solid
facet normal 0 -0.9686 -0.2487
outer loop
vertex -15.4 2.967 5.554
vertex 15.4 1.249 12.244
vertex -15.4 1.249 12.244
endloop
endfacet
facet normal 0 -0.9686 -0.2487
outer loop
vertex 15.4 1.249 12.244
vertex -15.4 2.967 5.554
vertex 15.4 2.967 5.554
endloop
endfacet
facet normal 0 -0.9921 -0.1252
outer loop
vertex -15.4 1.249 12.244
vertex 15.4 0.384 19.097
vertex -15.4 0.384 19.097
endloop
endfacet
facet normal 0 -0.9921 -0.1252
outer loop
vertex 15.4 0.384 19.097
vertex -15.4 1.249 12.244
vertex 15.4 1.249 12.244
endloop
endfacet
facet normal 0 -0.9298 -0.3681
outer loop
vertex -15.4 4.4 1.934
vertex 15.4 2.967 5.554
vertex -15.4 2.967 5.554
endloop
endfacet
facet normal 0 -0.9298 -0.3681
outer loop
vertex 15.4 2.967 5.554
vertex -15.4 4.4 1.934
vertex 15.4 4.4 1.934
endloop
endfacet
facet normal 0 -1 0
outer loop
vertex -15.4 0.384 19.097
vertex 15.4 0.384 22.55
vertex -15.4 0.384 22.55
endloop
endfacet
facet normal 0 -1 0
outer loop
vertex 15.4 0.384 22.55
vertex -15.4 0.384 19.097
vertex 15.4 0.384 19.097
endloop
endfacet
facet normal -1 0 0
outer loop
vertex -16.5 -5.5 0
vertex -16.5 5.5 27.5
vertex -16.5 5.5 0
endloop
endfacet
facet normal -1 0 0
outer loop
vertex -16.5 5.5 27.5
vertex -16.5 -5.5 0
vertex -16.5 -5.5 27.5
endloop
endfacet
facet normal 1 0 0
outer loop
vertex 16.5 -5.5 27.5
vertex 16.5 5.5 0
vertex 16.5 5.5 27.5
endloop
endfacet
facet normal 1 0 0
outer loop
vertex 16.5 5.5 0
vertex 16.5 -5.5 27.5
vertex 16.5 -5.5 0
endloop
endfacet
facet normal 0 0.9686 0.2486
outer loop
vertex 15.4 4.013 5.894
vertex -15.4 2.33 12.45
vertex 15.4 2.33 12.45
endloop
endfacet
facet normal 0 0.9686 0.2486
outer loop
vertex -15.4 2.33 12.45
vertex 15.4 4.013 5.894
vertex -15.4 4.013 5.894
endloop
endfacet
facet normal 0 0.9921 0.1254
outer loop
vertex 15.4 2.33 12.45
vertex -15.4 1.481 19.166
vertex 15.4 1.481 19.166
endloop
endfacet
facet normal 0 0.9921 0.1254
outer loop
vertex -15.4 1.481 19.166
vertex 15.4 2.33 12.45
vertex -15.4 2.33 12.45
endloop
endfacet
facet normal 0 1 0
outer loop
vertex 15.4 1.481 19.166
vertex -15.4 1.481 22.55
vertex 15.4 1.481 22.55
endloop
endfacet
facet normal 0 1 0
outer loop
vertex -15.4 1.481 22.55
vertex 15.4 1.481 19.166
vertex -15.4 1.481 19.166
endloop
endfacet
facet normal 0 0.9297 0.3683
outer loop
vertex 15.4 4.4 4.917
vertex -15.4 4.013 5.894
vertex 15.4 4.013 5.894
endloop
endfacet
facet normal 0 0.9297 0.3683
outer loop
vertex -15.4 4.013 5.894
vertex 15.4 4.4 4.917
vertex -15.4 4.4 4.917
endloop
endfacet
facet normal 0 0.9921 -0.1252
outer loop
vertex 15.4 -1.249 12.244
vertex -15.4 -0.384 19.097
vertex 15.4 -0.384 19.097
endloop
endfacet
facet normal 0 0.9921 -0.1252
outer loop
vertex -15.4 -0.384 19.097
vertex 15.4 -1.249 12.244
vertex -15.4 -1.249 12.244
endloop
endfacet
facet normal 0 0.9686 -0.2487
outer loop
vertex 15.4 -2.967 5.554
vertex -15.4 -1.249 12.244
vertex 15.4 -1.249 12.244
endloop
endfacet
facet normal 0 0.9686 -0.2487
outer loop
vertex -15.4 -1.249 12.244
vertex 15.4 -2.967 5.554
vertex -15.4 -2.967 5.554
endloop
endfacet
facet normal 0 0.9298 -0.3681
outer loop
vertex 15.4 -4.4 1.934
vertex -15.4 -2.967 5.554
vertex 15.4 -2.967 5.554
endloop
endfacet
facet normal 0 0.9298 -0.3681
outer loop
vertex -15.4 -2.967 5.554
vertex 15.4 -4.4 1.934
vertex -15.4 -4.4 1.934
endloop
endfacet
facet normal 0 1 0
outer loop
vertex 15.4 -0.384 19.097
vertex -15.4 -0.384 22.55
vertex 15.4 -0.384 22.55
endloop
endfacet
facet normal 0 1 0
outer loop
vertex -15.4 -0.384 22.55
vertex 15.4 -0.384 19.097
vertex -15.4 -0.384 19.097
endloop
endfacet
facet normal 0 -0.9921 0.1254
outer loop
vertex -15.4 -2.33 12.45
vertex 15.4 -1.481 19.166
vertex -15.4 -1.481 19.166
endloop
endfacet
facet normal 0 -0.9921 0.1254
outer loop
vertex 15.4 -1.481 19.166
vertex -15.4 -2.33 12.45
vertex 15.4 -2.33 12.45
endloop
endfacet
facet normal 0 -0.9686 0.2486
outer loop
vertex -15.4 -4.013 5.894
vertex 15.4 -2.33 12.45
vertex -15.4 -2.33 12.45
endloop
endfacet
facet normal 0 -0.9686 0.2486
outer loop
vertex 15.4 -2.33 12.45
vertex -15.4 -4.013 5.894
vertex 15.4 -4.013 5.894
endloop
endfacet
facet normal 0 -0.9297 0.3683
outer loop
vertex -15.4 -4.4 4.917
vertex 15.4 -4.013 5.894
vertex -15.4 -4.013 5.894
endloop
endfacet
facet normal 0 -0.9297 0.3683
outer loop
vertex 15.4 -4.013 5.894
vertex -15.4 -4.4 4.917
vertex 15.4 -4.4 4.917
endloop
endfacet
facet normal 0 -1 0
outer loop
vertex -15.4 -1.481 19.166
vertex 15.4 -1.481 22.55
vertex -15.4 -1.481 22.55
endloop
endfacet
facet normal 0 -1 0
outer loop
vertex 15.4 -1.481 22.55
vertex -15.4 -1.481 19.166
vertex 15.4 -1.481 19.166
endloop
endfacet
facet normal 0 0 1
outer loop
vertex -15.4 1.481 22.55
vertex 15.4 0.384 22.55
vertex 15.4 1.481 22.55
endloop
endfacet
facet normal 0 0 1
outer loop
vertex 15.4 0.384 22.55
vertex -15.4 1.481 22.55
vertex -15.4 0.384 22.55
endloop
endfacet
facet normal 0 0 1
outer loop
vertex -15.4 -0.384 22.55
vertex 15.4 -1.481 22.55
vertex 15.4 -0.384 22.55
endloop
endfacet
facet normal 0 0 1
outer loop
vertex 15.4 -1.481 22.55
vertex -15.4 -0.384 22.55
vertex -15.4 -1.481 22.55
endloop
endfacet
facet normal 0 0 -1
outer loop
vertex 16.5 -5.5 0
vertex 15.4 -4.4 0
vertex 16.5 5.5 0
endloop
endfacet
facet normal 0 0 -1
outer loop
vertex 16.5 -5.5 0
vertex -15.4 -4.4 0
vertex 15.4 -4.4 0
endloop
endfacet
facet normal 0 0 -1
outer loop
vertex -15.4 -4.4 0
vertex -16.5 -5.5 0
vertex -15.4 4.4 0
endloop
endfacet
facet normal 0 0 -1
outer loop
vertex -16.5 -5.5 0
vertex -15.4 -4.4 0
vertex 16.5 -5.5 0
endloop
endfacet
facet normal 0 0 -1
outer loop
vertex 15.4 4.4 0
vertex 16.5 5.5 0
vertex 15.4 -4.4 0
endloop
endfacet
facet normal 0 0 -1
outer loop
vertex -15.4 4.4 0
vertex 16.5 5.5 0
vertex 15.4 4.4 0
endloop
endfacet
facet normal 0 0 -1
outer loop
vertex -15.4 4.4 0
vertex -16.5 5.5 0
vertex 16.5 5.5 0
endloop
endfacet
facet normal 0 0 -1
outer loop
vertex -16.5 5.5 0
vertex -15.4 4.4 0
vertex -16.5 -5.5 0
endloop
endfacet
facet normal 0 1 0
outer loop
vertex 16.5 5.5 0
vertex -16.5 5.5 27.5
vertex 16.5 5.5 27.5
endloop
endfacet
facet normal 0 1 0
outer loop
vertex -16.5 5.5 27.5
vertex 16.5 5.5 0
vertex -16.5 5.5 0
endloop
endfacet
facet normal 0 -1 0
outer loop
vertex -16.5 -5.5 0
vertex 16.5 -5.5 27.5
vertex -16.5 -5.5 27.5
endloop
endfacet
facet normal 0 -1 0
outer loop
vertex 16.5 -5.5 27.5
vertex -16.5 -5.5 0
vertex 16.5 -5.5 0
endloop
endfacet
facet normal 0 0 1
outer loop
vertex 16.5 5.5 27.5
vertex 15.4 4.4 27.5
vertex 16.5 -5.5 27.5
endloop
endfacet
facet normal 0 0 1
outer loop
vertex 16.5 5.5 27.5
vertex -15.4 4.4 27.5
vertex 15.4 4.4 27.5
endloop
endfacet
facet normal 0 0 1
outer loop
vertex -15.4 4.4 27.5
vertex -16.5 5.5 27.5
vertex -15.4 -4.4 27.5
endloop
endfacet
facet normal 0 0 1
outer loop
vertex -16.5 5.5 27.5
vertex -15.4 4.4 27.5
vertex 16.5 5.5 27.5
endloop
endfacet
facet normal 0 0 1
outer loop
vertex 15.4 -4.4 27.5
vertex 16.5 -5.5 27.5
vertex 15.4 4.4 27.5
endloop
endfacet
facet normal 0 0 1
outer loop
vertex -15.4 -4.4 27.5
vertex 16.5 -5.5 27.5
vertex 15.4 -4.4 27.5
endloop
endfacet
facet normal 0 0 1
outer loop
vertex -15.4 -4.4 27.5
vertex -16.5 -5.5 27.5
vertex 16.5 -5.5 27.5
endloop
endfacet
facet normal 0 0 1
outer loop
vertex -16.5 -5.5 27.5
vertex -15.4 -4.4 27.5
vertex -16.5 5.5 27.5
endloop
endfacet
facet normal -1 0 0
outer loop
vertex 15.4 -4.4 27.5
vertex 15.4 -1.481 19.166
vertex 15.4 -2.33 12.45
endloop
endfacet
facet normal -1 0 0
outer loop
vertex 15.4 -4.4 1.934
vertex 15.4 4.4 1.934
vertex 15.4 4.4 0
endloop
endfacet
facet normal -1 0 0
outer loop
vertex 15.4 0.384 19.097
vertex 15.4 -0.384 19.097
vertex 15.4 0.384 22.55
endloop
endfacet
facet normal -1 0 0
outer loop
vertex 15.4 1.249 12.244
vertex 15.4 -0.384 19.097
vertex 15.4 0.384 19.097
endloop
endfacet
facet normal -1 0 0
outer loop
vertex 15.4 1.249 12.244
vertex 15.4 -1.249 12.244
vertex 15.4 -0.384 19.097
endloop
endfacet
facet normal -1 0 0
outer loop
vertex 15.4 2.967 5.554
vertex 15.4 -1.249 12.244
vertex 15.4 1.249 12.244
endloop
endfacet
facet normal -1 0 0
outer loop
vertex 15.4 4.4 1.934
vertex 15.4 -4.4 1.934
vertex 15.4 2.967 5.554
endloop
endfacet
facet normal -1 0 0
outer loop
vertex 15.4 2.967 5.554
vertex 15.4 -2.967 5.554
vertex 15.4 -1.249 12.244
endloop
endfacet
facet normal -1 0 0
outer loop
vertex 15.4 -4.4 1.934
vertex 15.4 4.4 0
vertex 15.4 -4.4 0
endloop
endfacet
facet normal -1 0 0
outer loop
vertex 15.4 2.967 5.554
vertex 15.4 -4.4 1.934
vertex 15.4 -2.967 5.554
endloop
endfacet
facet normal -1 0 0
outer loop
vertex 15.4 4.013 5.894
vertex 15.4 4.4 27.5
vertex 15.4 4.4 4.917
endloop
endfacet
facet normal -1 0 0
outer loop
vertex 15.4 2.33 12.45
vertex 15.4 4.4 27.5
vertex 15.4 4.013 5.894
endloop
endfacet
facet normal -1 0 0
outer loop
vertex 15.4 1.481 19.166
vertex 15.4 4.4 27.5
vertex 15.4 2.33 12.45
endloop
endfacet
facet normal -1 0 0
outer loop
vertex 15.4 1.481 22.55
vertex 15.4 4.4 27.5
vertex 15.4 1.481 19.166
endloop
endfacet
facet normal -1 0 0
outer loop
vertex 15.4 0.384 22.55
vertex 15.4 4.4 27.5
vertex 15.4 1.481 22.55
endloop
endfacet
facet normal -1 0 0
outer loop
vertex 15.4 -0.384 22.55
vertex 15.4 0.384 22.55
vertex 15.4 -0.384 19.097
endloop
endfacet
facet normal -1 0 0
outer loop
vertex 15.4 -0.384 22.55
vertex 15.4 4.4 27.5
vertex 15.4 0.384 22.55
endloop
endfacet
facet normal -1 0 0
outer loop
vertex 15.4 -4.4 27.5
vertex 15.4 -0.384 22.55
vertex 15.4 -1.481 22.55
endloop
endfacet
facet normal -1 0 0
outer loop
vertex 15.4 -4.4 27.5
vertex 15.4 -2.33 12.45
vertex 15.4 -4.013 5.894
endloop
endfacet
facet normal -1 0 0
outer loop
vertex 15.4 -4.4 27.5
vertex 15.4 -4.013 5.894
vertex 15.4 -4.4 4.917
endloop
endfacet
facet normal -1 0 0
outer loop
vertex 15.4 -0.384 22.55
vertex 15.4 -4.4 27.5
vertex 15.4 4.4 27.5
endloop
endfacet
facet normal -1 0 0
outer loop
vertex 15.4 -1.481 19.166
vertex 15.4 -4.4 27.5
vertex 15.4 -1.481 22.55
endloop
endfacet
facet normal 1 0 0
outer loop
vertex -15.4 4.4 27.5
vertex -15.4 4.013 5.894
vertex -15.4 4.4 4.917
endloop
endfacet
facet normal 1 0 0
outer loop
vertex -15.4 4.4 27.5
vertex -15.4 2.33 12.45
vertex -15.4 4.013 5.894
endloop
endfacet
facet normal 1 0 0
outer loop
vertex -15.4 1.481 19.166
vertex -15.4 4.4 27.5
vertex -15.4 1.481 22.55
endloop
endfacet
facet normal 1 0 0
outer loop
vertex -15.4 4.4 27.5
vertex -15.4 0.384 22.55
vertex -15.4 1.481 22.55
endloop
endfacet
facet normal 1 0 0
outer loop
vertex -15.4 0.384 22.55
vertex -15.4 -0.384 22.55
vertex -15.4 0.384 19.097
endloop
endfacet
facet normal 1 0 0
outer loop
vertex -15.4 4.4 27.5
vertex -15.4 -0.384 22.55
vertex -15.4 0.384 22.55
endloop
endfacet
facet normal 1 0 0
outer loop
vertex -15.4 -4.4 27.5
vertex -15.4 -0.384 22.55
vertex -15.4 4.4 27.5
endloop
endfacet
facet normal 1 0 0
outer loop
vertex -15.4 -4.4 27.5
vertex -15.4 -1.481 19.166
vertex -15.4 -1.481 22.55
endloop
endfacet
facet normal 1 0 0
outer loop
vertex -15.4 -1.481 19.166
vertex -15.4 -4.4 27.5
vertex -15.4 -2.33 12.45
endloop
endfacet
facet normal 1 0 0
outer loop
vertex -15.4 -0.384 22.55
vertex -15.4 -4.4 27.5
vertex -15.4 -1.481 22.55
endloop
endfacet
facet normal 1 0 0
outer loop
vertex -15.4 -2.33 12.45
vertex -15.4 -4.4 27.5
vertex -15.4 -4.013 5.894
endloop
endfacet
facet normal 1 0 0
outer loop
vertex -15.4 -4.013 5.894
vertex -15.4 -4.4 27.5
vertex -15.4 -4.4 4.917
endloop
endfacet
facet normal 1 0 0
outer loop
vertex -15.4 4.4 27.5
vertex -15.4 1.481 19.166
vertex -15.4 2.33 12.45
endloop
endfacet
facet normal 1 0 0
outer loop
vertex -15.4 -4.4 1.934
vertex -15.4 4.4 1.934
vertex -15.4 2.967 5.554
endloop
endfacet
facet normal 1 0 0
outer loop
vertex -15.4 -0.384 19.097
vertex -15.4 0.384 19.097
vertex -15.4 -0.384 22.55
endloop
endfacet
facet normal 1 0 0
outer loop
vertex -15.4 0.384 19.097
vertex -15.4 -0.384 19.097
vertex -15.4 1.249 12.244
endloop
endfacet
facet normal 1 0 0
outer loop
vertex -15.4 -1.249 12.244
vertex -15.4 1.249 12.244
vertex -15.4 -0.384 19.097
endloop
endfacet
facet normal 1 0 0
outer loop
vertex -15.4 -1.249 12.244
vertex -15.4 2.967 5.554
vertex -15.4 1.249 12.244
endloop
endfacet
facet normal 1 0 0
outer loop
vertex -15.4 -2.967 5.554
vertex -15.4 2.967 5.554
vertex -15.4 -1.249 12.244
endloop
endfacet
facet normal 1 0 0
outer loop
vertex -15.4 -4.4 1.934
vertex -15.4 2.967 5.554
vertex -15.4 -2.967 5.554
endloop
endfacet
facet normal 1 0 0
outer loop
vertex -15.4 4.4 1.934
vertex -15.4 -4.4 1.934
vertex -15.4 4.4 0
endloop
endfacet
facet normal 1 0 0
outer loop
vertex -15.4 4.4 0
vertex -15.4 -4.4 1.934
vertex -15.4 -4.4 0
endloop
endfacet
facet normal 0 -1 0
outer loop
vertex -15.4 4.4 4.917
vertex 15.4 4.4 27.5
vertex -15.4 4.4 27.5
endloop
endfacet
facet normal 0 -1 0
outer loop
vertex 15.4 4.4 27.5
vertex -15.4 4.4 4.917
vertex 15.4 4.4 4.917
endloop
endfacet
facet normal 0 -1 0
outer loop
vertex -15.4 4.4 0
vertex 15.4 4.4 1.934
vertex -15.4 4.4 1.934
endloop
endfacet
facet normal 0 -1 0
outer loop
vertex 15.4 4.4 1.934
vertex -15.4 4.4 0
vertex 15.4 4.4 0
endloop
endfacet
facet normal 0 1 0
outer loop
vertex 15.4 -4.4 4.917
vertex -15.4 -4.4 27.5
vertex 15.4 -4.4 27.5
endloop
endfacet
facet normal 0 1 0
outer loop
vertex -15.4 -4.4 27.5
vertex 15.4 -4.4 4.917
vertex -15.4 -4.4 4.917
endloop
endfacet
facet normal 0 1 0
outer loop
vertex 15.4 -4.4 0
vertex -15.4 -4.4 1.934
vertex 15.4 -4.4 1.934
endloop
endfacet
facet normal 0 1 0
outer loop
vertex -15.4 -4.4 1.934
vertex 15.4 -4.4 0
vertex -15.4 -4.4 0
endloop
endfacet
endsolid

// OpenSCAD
scale(1.1) union() {
translate([0,0,12.5]) union() {
intersection() {
translate([0,0,8]) difference() {
rotate([0,90,0]) union() {
translate([0,50.25,-15]) difference() {
cylinder(30,50,50,$fn=50); 
cylinder(30,49,49,$fn=50); 
}
rotate([0,0,180]) translate([0,50.25,-15]) difference() {
cylinder(30,50,50,$fn=50); 
cylinder(30,49,49,$fn=50); 
}
}
translate([0,0,50]) cube([100,100,100],center=true); 
}
cube([30,10,25],center=true); 
}
difference() {
cube([30,10,25],center=true); 
cube([28,8,25],center=true); 
}
}
%cube(40,60,80); 
}
